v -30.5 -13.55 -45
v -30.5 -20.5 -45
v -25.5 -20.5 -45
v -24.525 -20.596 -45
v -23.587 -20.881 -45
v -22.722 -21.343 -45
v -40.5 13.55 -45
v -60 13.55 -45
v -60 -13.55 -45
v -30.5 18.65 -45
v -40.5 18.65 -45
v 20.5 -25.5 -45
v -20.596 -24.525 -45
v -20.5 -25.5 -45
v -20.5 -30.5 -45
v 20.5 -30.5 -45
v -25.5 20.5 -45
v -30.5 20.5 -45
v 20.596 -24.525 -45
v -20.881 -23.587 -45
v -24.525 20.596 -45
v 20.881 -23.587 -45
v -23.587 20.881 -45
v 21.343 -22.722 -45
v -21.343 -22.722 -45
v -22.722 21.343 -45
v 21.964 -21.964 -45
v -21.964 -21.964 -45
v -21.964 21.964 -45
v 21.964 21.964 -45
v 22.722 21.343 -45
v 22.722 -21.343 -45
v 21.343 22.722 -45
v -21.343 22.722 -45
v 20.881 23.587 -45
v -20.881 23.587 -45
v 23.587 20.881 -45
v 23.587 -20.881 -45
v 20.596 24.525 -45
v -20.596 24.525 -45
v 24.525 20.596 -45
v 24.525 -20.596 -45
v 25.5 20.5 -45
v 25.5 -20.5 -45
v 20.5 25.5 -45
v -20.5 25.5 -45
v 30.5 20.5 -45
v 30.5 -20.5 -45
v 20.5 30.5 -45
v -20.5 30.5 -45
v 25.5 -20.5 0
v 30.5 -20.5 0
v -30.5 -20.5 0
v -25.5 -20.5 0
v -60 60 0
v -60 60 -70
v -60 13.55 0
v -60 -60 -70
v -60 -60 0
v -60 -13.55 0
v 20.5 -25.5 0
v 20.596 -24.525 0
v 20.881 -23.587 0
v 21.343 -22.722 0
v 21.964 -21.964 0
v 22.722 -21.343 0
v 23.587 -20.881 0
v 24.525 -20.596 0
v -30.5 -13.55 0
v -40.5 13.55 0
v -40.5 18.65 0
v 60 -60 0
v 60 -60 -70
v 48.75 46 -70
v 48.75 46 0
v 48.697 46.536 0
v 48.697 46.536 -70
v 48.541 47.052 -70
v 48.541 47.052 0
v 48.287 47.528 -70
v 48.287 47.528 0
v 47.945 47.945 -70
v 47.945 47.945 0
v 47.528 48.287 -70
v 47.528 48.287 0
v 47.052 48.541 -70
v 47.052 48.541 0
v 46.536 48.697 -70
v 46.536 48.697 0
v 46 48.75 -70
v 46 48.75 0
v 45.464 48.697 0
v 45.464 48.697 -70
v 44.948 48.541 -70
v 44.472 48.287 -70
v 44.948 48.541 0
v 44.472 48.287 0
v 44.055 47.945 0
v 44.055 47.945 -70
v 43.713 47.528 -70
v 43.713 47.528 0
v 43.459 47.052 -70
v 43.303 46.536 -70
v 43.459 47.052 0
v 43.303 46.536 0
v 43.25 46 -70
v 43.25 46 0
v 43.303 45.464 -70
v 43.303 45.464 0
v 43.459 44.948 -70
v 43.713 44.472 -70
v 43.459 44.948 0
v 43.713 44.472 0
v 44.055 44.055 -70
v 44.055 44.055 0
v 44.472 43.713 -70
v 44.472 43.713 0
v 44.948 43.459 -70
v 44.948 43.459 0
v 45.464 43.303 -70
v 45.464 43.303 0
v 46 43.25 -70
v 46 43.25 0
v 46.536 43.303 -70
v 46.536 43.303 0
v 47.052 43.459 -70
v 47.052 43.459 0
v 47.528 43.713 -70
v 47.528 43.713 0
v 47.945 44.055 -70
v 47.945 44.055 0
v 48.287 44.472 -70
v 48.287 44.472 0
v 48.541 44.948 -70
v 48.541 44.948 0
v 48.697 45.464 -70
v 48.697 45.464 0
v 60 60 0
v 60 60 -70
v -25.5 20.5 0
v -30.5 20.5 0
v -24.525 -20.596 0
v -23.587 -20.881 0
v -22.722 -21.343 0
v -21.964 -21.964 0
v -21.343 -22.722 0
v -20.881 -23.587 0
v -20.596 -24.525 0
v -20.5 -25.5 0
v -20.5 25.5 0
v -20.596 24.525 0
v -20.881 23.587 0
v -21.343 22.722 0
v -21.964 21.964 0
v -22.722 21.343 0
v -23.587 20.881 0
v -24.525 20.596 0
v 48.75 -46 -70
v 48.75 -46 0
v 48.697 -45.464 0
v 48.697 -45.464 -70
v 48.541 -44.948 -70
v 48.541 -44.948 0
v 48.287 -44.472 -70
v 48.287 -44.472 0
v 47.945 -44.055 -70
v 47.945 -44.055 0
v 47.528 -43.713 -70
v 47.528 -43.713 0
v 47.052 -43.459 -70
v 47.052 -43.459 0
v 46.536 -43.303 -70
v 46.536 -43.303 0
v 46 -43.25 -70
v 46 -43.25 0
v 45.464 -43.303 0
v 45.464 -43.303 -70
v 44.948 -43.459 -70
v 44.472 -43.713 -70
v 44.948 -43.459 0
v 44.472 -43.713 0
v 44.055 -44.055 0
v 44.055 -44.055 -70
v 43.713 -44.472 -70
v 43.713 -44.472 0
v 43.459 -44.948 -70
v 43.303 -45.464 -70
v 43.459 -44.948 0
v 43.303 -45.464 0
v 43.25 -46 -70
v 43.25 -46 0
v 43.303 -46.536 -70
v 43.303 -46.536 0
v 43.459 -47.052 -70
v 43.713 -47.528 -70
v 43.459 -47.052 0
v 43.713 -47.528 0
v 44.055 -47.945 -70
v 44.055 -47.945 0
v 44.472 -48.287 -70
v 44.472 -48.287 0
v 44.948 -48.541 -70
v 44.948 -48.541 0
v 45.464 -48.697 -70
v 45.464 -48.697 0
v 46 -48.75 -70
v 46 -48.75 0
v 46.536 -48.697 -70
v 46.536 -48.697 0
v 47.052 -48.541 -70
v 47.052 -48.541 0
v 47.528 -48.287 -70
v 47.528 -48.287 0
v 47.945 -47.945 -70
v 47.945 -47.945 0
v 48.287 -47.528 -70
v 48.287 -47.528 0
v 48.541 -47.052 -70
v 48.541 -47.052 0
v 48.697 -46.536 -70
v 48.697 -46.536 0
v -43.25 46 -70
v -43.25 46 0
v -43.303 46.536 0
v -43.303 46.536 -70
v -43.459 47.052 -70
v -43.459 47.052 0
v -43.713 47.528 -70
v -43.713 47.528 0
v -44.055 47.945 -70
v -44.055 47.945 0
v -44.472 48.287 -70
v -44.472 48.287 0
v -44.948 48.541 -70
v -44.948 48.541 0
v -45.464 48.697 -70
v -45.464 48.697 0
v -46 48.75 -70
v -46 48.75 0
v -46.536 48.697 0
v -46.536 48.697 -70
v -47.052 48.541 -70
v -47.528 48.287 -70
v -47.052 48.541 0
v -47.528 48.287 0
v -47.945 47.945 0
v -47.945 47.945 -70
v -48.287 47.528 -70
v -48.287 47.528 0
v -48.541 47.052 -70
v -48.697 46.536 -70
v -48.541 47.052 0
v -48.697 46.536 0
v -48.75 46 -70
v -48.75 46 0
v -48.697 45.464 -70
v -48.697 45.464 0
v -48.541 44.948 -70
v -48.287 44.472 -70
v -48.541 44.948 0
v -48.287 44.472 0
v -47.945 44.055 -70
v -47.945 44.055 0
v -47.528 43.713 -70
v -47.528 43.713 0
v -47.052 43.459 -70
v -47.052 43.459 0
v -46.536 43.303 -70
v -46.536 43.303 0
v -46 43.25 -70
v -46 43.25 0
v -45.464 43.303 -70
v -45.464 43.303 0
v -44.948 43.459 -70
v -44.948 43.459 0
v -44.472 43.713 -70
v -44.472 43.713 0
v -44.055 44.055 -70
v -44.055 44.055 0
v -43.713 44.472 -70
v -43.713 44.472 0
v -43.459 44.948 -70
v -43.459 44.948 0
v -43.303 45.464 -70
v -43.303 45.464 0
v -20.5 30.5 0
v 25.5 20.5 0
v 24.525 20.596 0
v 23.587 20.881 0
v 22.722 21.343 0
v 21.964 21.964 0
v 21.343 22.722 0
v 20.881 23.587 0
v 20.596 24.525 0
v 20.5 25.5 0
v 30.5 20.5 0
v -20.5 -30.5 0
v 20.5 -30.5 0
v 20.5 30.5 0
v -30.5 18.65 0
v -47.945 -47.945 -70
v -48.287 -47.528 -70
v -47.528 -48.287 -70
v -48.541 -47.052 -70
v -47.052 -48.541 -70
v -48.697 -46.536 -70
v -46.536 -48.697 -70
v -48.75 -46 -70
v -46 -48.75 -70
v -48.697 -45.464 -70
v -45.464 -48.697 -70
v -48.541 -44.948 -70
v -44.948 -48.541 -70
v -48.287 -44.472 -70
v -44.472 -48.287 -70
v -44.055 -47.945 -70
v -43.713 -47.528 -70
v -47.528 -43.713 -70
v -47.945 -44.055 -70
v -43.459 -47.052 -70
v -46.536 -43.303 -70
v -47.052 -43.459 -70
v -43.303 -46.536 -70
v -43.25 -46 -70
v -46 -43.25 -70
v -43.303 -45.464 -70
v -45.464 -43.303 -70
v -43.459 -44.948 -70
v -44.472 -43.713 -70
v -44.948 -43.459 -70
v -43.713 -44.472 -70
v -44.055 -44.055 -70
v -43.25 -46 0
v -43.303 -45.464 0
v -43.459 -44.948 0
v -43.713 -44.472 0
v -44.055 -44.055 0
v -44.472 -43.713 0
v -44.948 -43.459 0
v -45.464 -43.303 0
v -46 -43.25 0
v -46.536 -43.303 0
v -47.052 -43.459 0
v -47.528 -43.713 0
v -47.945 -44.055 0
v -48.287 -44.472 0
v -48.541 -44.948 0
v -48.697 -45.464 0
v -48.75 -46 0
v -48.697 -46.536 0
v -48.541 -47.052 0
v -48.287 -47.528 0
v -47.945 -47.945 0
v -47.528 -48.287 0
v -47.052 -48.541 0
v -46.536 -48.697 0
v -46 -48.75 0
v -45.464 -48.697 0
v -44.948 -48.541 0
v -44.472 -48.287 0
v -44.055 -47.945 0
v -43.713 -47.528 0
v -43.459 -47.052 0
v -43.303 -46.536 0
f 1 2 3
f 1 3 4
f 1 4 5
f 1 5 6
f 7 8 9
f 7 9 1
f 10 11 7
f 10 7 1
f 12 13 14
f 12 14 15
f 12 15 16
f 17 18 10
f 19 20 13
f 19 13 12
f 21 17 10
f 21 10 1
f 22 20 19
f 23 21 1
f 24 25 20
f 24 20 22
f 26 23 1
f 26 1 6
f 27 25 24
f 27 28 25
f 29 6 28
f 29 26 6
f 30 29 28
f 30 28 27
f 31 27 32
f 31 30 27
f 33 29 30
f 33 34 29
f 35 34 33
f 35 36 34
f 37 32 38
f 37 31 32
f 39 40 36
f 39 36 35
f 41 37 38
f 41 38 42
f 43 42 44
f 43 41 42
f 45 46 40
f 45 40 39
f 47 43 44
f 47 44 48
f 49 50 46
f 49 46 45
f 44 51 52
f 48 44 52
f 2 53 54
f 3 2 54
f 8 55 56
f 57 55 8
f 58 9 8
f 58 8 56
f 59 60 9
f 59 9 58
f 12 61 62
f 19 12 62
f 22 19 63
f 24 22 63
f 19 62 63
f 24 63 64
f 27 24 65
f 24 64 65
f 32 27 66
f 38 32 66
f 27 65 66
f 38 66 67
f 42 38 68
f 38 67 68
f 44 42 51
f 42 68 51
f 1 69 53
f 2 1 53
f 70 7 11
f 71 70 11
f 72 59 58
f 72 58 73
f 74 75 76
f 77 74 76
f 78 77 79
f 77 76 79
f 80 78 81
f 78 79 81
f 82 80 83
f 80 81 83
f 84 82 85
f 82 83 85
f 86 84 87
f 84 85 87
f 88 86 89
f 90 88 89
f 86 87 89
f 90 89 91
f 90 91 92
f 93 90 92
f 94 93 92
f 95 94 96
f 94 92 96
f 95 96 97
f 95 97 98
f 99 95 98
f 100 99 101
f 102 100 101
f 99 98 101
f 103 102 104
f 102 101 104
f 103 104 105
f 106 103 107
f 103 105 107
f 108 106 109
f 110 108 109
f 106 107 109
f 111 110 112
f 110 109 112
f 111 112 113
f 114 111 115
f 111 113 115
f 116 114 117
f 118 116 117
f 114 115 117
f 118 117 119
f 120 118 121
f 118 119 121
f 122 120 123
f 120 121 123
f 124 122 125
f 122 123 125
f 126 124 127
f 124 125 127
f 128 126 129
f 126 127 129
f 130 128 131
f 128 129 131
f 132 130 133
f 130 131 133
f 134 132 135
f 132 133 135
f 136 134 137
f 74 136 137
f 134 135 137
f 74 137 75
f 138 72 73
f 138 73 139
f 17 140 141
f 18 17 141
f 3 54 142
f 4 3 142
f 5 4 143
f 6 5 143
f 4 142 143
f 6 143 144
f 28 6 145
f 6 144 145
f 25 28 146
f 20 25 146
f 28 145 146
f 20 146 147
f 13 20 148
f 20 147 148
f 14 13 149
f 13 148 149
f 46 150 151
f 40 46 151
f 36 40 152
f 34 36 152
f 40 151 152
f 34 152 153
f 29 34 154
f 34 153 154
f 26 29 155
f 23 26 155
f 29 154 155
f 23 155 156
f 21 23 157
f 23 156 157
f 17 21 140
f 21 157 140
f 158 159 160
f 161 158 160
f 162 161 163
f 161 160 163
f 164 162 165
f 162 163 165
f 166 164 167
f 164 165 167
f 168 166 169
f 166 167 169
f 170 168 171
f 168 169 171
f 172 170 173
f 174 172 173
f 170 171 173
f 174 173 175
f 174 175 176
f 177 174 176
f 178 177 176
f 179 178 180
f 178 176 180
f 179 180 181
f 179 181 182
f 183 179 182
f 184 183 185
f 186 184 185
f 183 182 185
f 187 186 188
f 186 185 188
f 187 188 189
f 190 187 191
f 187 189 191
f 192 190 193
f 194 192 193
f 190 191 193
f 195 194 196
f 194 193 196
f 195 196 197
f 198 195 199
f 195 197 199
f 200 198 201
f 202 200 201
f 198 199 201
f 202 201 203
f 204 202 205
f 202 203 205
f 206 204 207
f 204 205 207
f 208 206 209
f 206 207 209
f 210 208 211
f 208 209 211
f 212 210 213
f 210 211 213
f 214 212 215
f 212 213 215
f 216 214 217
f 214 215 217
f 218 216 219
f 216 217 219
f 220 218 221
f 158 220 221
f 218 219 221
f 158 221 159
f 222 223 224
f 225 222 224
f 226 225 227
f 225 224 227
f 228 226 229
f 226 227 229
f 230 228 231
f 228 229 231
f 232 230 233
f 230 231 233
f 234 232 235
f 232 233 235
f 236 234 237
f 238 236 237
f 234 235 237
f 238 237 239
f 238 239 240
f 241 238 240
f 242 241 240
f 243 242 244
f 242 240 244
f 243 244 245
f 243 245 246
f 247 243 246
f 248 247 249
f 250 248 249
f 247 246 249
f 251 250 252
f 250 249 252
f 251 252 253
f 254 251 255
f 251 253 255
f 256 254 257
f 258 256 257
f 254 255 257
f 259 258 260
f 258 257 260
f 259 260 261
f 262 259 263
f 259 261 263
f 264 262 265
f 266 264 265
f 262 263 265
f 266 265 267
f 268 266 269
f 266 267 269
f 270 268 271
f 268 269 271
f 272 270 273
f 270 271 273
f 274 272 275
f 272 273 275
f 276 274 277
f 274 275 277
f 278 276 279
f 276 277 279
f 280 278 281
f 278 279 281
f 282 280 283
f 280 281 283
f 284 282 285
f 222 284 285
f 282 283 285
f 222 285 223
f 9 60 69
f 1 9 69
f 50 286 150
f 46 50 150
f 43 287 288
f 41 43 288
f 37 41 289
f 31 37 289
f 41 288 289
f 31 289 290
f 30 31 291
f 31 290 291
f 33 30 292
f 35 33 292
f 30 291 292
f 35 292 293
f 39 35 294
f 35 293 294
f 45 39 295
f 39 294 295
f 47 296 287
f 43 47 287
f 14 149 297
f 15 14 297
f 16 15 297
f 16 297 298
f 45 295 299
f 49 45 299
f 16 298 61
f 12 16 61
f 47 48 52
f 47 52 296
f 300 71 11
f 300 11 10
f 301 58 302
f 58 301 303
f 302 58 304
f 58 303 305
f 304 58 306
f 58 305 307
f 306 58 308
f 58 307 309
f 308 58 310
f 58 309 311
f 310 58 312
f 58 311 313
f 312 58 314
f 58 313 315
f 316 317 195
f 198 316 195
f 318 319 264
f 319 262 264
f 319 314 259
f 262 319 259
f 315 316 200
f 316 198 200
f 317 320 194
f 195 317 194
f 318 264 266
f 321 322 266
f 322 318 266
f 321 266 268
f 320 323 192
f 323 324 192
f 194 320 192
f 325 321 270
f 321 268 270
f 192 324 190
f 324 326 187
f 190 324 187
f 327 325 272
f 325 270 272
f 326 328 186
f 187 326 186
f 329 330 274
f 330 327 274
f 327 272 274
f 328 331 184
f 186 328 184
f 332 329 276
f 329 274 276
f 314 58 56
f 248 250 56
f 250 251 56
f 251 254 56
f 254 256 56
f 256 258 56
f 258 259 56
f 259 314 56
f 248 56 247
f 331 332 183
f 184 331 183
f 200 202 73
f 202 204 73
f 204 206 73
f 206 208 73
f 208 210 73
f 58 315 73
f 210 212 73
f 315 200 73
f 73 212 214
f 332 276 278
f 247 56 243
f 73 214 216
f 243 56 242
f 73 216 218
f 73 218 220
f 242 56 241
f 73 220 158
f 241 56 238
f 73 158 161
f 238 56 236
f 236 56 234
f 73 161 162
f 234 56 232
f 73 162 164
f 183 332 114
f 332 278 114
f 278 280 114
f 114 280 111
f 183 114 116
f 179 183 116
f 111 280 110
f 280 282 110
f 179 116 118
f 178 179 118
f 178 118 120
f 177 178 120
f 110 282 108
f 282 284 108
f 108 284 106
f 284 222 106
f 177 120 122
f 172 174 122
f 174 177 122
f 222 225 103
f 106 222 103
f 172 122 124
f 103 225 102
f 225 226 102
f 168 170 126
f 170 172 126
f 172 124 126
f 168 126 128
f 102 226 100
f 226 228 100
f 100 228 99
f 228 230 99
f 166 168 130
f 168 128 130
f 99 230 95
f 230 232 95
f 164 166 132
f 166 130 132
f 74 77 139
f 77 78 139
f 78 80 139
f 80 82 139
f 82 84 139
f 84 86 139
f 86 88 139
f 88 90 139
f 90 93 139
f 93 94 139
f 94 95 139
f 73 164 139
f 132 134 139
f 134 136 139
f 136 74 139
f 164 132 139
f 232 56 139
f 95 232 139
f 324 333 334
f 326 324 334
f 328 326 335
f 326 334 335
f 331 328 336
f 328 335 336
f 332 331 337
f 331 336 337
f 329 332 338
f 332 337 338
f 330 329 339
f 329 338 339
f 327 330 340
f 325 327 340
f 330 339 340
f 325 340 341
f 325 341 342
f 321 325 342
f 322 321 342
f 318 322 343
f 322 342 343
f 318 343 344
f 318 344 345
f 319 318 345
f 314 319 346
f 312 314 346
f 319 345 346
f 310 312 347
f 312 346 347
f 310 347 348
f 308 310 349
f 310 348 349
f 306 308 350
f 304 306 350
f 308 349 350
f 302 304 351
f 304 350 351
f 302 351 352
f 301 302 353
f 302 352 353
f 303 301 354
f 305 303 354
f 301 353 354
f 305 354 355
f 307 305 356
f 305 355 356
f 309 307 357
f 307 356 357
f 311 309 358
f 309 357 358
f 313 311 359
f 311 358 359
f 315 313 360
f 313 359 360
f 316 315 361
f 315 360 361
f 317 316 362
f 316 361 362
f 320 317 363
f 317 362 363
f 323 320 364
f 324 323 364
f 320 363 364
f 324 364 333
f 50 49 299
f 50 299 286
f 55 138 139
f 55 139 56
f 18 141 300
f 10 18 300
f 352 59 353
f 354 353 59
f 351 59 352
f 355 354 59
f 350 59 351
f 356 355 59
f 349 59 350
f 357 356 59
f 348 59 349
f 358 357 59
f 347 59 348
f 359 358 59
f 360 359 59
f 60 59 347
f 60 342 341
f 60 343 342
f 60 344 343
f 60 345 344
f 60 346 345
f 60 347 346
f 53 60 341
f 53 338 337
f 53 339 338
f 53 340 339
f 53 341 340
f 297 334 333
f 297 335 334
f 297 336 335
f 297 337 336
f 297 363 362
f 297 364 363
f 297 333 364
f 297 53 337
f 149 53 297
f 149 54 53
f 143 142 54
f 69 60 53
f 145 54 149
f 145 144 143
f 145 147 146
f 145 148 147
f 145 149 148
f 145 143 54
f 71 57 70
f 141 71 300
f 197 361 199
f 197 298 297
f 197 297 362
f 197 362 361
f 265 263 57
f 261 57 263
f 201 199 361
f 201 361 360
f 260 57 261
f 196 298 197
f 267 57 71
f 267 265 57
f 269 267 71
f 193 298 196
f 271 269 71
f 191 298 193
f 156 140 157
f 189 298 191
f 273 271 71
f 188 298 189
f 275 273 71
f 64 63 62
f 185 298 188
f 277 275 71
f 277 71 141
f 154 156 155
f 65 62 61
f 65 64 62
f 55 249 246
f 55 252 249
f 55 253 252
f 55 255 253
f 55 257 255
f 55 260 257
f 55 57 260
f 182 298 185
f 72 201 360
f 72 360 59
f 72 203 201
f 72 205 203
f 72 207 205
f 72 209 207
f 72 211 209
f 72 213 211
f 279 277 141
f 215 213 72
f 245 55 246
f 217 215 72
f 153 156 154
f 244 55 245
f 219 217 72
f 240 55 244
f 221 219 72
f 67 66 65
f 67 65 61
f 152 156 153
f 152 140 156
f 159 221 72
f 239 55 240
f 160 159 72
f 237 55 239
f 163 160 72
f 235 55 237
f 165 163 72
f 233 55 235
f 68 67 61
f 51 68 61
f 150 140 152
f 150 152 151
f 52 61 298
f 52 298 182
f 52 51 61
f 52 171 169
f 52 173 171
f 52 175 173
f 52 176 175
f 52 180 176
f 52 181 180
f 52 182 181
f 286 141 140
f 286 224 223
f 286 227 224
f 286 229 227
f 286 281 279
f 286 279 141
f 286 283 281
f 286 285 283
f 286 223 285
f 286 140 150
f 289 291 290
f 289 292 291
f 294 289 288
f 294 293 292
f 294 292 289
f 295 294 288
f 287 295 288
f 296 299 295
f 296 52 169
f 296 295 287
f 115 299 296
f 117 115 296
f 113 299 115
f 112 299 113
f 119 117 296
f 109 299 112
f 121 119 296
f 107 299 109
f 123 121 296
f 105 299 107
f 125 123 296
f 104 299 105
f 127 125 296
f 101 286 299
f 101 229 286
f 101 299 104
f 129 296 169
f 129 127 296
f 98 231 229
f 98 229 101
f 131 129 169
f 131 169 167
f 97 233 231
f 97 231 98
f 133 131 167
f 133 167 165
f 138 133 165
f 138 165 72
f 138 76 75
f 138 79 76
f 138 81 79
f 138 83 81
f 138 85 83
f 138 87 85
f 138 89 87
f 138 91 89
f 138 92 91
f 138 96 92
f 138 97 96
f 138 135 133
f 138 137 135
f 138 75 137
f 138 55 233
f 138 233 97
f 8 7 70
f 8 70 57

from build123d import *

# Parameters (mm, degrees)
F0_R     = 2.75
F0_W     = 10
F0_H     = 5.1
F1_DEPTH = 70
F2_DEPTH = 45


# Not quite as in the source:
# - a feature names something its author has since deleted; it is built from what else it names


with BuildPart() as f1:
    # F0 (on Top) → F1 (new body)
    with BuildSketch(Plane.XY):
        with BuildLine():
            Line((-60, -60), (60, -60))
            Line((60, -60), (60, 60))
            Line((60, 60), (-60, 60))
            Line((-60, 60), (-60, 13.55))
            Line((-60, 13.55), (-40.5, 13.55))
            Line((-40.5, 13.55), (-40.5, 18.65))
            Line((-40.5, 18.65), (-30.5, 18.65))
            Line((-30.5, 18.65), (-30.5, 20.5))
            Line((-30.5, 20.5), (-25.5, 20.5))
            ThreePointArc((-25.5, 20.5), (-21.9644660941, 21.9644660941), (-20.5, 25.5))
            Line((-20.5, 25.5), (-20.5, 30.5))
            Line((-20.5, 30.5), (20.5, 30.5))
            Line((20.5, 30.5), (20.5, 25.5))
            ThreePointArc((20.5, 25.5), (21.9644660941, 21.9644660941), (25.5, 20.5))
            Line((25.5, 20.5), (30.5, 20.5))
            Line((30.5, 20.5), (30.5, -20.5))
            Line((30.5, -20.5), (25.5, -20.5))
            ThreePointArc((25.5, -20.5), (21.9644660941, -21.9644660941), (20.5, -25.5))
            Line((20.5, -25.5), (20.5, -30.5))
            Line((20.5, -30.5), (-20.5, -30.5))
            Line((-20.5, -30.5), (-20.5, -25.5))
            ThreePointArc((-20.5, -25.5), (-21.9644660941, -21.9644660941), (-25.5, -20.5))
            Line((-25.5, -20.5), (-30.5, -20.5))
            Line((-30.5, -20.5), (-30.5, -18.65))
            Line((-30.5, -18.65), (-30.5, -13.55))
            Line((-30.5, -13.55), (-40.5, -13.55))
            Line((-40.5, -13.55), (-60, -13.55))
            Line((-60, -13.55), (-60, -18.65))
            Line((-60, -18.65), (-60, -60))
        make_face()
        with Locations((-46, -46)):
            Circle(F0_R, mode=Mode.SUBTRACT)
        with Locations((46, -46)):
            Circle(F0_R, mode=Mode.SUBTRACT)
        with Locations((-46, 46)):
            Circle(F0_R, mode=Mode.SUBTRACT)
        with Locations((46, 46)):
            Circle(F0_R, mode=Mode.SUBTRACT)
        Polygon((-60, 13.55), (-60, -13.55), (-40.5, -13.55), (-30.5, -13.55), (-30.5, 13.55), (-40.5, 13.55), align=None)
        with BuildLine():
            Line((-30.5, 13.55), (-30.5, -13.55))
            Line((-30.5, -13.55), (-30.5, -18.65))
            Line((-30.5, -18.65), (-30.5, -20.5))
            Line((-30.5, -20.5), (-25.5, -20.5))
            ThreePointArc((-25.5, -20.5), (-21.9644660941, -21.9644660941), (-20.5, -25.5))
            Line((-20.5, -25.5), (-20.5, -30.5))
            Line((-20.5, -30.5), (20.5, -30.5))
            Line((20.5, -30.5), (20.5, -25.5))
            ThreePointArc((20.5, -25.5), (21.9644660941, -21.9644660941), (25.5, -20.5))
            Line((25.5, -20.5), (30.5, -20.5))
            Line((30.5, -20.5), (30.5, 20.5))
            Line((30.5, 20.5), (25.5, 20.5))
            ThreePointArc((25.5, 20.5), (21.9644660941, 21.9644660941), (20.5, 25.5))
            Line((20.5, 25.5), (20.5, 30.5))
            Line((20.5, 30.5), (-20.5, 30.5))
            Line((-20.5, 30.5), (-20.5, 25.5))
            ThreePointArc((-20.5, 25.5), (-21.9644660941, 21.9644660941), (-25.5, 20.5))
            Line((-25.5, 20.5), (-30.5, 20.5))
            Line((-30.5, 20.5), (-30.5, 18.65))
            Line((-30.5, 18.65), (-30.5, 13.55))
        make_face()
        with Locations((-35.5, 16.1)):
            Rectangle(F0_W, F0_H)
    extrude(amount=-F1_DEPTH)

    # F0 (on Top) → F2 (cut)
    with BuildSketch(Plane.XY):
        Polygon((-60, 13.55), (-60, -13.55), (-40.5, -13.55), (-30.5, -13.55), (-30.5, 13.55), (-40.5, 13.55), align=None)
        with BuildLine():
            Line((-30.5, 13.55), (-30.5, -13.55))
            Line((-30.5, -13.55), (-30.5, -18.65))
            Line((-30.5, -18.65), (-30.5, -20.5))
            Line((-30.5, -20.5), (-25.5, -20.5))
            ThreePointArc((-25.5, -20.5), (-21.9644660941, -21.9644660941), (-20.5, -25.5))
            Line((-20.5, -25.5), (-20.5, -30.5))
            Line((-20.5, -30.5), (20.5, -30.5))
            Line((20.5, -30.5), (20.5, -25.5))
            ThreePointArc((20.5, -25.5), (21.9644660941, -21.9644660941), (25.5, -20.5))
            Line((25.5, -20.5), (30.5, -20.5))
            Line((30.5, -20.5), (30.5, 20.5))
            Line((30.5, 20.5), (25.5, 20.5))
            ThreePointArc((25.5, 20.5), (21.9644660941, 21.9644660941), (20.5, 25.5))
            Line((20.5, 25.5), (20.5, 30.5))
            Line((20.5, 30.5), (-20.5, 30.5))
            Line((-20.5, 30.5), (-20.5, 25.5))
            ThreePointArc((-20.5, 25.5), (-21.9644660941, 21.9644660941), (-25.5, 20.5))
            Line((-25.5, 20.5), (-30.5, 20.5))
            Line((-30.5, 20.5), (-30.5, 18.65))
            Line((-30.5, 18.65), (-30.5, 13.55))
        make_face()
        with Locations((-35.5, 16.1)):
            Rectangle(F0_W, F0_H)
    extrude(amount=-F2_DEPTH, mode=Mode.SUBTRACT)


solid = f1.part
